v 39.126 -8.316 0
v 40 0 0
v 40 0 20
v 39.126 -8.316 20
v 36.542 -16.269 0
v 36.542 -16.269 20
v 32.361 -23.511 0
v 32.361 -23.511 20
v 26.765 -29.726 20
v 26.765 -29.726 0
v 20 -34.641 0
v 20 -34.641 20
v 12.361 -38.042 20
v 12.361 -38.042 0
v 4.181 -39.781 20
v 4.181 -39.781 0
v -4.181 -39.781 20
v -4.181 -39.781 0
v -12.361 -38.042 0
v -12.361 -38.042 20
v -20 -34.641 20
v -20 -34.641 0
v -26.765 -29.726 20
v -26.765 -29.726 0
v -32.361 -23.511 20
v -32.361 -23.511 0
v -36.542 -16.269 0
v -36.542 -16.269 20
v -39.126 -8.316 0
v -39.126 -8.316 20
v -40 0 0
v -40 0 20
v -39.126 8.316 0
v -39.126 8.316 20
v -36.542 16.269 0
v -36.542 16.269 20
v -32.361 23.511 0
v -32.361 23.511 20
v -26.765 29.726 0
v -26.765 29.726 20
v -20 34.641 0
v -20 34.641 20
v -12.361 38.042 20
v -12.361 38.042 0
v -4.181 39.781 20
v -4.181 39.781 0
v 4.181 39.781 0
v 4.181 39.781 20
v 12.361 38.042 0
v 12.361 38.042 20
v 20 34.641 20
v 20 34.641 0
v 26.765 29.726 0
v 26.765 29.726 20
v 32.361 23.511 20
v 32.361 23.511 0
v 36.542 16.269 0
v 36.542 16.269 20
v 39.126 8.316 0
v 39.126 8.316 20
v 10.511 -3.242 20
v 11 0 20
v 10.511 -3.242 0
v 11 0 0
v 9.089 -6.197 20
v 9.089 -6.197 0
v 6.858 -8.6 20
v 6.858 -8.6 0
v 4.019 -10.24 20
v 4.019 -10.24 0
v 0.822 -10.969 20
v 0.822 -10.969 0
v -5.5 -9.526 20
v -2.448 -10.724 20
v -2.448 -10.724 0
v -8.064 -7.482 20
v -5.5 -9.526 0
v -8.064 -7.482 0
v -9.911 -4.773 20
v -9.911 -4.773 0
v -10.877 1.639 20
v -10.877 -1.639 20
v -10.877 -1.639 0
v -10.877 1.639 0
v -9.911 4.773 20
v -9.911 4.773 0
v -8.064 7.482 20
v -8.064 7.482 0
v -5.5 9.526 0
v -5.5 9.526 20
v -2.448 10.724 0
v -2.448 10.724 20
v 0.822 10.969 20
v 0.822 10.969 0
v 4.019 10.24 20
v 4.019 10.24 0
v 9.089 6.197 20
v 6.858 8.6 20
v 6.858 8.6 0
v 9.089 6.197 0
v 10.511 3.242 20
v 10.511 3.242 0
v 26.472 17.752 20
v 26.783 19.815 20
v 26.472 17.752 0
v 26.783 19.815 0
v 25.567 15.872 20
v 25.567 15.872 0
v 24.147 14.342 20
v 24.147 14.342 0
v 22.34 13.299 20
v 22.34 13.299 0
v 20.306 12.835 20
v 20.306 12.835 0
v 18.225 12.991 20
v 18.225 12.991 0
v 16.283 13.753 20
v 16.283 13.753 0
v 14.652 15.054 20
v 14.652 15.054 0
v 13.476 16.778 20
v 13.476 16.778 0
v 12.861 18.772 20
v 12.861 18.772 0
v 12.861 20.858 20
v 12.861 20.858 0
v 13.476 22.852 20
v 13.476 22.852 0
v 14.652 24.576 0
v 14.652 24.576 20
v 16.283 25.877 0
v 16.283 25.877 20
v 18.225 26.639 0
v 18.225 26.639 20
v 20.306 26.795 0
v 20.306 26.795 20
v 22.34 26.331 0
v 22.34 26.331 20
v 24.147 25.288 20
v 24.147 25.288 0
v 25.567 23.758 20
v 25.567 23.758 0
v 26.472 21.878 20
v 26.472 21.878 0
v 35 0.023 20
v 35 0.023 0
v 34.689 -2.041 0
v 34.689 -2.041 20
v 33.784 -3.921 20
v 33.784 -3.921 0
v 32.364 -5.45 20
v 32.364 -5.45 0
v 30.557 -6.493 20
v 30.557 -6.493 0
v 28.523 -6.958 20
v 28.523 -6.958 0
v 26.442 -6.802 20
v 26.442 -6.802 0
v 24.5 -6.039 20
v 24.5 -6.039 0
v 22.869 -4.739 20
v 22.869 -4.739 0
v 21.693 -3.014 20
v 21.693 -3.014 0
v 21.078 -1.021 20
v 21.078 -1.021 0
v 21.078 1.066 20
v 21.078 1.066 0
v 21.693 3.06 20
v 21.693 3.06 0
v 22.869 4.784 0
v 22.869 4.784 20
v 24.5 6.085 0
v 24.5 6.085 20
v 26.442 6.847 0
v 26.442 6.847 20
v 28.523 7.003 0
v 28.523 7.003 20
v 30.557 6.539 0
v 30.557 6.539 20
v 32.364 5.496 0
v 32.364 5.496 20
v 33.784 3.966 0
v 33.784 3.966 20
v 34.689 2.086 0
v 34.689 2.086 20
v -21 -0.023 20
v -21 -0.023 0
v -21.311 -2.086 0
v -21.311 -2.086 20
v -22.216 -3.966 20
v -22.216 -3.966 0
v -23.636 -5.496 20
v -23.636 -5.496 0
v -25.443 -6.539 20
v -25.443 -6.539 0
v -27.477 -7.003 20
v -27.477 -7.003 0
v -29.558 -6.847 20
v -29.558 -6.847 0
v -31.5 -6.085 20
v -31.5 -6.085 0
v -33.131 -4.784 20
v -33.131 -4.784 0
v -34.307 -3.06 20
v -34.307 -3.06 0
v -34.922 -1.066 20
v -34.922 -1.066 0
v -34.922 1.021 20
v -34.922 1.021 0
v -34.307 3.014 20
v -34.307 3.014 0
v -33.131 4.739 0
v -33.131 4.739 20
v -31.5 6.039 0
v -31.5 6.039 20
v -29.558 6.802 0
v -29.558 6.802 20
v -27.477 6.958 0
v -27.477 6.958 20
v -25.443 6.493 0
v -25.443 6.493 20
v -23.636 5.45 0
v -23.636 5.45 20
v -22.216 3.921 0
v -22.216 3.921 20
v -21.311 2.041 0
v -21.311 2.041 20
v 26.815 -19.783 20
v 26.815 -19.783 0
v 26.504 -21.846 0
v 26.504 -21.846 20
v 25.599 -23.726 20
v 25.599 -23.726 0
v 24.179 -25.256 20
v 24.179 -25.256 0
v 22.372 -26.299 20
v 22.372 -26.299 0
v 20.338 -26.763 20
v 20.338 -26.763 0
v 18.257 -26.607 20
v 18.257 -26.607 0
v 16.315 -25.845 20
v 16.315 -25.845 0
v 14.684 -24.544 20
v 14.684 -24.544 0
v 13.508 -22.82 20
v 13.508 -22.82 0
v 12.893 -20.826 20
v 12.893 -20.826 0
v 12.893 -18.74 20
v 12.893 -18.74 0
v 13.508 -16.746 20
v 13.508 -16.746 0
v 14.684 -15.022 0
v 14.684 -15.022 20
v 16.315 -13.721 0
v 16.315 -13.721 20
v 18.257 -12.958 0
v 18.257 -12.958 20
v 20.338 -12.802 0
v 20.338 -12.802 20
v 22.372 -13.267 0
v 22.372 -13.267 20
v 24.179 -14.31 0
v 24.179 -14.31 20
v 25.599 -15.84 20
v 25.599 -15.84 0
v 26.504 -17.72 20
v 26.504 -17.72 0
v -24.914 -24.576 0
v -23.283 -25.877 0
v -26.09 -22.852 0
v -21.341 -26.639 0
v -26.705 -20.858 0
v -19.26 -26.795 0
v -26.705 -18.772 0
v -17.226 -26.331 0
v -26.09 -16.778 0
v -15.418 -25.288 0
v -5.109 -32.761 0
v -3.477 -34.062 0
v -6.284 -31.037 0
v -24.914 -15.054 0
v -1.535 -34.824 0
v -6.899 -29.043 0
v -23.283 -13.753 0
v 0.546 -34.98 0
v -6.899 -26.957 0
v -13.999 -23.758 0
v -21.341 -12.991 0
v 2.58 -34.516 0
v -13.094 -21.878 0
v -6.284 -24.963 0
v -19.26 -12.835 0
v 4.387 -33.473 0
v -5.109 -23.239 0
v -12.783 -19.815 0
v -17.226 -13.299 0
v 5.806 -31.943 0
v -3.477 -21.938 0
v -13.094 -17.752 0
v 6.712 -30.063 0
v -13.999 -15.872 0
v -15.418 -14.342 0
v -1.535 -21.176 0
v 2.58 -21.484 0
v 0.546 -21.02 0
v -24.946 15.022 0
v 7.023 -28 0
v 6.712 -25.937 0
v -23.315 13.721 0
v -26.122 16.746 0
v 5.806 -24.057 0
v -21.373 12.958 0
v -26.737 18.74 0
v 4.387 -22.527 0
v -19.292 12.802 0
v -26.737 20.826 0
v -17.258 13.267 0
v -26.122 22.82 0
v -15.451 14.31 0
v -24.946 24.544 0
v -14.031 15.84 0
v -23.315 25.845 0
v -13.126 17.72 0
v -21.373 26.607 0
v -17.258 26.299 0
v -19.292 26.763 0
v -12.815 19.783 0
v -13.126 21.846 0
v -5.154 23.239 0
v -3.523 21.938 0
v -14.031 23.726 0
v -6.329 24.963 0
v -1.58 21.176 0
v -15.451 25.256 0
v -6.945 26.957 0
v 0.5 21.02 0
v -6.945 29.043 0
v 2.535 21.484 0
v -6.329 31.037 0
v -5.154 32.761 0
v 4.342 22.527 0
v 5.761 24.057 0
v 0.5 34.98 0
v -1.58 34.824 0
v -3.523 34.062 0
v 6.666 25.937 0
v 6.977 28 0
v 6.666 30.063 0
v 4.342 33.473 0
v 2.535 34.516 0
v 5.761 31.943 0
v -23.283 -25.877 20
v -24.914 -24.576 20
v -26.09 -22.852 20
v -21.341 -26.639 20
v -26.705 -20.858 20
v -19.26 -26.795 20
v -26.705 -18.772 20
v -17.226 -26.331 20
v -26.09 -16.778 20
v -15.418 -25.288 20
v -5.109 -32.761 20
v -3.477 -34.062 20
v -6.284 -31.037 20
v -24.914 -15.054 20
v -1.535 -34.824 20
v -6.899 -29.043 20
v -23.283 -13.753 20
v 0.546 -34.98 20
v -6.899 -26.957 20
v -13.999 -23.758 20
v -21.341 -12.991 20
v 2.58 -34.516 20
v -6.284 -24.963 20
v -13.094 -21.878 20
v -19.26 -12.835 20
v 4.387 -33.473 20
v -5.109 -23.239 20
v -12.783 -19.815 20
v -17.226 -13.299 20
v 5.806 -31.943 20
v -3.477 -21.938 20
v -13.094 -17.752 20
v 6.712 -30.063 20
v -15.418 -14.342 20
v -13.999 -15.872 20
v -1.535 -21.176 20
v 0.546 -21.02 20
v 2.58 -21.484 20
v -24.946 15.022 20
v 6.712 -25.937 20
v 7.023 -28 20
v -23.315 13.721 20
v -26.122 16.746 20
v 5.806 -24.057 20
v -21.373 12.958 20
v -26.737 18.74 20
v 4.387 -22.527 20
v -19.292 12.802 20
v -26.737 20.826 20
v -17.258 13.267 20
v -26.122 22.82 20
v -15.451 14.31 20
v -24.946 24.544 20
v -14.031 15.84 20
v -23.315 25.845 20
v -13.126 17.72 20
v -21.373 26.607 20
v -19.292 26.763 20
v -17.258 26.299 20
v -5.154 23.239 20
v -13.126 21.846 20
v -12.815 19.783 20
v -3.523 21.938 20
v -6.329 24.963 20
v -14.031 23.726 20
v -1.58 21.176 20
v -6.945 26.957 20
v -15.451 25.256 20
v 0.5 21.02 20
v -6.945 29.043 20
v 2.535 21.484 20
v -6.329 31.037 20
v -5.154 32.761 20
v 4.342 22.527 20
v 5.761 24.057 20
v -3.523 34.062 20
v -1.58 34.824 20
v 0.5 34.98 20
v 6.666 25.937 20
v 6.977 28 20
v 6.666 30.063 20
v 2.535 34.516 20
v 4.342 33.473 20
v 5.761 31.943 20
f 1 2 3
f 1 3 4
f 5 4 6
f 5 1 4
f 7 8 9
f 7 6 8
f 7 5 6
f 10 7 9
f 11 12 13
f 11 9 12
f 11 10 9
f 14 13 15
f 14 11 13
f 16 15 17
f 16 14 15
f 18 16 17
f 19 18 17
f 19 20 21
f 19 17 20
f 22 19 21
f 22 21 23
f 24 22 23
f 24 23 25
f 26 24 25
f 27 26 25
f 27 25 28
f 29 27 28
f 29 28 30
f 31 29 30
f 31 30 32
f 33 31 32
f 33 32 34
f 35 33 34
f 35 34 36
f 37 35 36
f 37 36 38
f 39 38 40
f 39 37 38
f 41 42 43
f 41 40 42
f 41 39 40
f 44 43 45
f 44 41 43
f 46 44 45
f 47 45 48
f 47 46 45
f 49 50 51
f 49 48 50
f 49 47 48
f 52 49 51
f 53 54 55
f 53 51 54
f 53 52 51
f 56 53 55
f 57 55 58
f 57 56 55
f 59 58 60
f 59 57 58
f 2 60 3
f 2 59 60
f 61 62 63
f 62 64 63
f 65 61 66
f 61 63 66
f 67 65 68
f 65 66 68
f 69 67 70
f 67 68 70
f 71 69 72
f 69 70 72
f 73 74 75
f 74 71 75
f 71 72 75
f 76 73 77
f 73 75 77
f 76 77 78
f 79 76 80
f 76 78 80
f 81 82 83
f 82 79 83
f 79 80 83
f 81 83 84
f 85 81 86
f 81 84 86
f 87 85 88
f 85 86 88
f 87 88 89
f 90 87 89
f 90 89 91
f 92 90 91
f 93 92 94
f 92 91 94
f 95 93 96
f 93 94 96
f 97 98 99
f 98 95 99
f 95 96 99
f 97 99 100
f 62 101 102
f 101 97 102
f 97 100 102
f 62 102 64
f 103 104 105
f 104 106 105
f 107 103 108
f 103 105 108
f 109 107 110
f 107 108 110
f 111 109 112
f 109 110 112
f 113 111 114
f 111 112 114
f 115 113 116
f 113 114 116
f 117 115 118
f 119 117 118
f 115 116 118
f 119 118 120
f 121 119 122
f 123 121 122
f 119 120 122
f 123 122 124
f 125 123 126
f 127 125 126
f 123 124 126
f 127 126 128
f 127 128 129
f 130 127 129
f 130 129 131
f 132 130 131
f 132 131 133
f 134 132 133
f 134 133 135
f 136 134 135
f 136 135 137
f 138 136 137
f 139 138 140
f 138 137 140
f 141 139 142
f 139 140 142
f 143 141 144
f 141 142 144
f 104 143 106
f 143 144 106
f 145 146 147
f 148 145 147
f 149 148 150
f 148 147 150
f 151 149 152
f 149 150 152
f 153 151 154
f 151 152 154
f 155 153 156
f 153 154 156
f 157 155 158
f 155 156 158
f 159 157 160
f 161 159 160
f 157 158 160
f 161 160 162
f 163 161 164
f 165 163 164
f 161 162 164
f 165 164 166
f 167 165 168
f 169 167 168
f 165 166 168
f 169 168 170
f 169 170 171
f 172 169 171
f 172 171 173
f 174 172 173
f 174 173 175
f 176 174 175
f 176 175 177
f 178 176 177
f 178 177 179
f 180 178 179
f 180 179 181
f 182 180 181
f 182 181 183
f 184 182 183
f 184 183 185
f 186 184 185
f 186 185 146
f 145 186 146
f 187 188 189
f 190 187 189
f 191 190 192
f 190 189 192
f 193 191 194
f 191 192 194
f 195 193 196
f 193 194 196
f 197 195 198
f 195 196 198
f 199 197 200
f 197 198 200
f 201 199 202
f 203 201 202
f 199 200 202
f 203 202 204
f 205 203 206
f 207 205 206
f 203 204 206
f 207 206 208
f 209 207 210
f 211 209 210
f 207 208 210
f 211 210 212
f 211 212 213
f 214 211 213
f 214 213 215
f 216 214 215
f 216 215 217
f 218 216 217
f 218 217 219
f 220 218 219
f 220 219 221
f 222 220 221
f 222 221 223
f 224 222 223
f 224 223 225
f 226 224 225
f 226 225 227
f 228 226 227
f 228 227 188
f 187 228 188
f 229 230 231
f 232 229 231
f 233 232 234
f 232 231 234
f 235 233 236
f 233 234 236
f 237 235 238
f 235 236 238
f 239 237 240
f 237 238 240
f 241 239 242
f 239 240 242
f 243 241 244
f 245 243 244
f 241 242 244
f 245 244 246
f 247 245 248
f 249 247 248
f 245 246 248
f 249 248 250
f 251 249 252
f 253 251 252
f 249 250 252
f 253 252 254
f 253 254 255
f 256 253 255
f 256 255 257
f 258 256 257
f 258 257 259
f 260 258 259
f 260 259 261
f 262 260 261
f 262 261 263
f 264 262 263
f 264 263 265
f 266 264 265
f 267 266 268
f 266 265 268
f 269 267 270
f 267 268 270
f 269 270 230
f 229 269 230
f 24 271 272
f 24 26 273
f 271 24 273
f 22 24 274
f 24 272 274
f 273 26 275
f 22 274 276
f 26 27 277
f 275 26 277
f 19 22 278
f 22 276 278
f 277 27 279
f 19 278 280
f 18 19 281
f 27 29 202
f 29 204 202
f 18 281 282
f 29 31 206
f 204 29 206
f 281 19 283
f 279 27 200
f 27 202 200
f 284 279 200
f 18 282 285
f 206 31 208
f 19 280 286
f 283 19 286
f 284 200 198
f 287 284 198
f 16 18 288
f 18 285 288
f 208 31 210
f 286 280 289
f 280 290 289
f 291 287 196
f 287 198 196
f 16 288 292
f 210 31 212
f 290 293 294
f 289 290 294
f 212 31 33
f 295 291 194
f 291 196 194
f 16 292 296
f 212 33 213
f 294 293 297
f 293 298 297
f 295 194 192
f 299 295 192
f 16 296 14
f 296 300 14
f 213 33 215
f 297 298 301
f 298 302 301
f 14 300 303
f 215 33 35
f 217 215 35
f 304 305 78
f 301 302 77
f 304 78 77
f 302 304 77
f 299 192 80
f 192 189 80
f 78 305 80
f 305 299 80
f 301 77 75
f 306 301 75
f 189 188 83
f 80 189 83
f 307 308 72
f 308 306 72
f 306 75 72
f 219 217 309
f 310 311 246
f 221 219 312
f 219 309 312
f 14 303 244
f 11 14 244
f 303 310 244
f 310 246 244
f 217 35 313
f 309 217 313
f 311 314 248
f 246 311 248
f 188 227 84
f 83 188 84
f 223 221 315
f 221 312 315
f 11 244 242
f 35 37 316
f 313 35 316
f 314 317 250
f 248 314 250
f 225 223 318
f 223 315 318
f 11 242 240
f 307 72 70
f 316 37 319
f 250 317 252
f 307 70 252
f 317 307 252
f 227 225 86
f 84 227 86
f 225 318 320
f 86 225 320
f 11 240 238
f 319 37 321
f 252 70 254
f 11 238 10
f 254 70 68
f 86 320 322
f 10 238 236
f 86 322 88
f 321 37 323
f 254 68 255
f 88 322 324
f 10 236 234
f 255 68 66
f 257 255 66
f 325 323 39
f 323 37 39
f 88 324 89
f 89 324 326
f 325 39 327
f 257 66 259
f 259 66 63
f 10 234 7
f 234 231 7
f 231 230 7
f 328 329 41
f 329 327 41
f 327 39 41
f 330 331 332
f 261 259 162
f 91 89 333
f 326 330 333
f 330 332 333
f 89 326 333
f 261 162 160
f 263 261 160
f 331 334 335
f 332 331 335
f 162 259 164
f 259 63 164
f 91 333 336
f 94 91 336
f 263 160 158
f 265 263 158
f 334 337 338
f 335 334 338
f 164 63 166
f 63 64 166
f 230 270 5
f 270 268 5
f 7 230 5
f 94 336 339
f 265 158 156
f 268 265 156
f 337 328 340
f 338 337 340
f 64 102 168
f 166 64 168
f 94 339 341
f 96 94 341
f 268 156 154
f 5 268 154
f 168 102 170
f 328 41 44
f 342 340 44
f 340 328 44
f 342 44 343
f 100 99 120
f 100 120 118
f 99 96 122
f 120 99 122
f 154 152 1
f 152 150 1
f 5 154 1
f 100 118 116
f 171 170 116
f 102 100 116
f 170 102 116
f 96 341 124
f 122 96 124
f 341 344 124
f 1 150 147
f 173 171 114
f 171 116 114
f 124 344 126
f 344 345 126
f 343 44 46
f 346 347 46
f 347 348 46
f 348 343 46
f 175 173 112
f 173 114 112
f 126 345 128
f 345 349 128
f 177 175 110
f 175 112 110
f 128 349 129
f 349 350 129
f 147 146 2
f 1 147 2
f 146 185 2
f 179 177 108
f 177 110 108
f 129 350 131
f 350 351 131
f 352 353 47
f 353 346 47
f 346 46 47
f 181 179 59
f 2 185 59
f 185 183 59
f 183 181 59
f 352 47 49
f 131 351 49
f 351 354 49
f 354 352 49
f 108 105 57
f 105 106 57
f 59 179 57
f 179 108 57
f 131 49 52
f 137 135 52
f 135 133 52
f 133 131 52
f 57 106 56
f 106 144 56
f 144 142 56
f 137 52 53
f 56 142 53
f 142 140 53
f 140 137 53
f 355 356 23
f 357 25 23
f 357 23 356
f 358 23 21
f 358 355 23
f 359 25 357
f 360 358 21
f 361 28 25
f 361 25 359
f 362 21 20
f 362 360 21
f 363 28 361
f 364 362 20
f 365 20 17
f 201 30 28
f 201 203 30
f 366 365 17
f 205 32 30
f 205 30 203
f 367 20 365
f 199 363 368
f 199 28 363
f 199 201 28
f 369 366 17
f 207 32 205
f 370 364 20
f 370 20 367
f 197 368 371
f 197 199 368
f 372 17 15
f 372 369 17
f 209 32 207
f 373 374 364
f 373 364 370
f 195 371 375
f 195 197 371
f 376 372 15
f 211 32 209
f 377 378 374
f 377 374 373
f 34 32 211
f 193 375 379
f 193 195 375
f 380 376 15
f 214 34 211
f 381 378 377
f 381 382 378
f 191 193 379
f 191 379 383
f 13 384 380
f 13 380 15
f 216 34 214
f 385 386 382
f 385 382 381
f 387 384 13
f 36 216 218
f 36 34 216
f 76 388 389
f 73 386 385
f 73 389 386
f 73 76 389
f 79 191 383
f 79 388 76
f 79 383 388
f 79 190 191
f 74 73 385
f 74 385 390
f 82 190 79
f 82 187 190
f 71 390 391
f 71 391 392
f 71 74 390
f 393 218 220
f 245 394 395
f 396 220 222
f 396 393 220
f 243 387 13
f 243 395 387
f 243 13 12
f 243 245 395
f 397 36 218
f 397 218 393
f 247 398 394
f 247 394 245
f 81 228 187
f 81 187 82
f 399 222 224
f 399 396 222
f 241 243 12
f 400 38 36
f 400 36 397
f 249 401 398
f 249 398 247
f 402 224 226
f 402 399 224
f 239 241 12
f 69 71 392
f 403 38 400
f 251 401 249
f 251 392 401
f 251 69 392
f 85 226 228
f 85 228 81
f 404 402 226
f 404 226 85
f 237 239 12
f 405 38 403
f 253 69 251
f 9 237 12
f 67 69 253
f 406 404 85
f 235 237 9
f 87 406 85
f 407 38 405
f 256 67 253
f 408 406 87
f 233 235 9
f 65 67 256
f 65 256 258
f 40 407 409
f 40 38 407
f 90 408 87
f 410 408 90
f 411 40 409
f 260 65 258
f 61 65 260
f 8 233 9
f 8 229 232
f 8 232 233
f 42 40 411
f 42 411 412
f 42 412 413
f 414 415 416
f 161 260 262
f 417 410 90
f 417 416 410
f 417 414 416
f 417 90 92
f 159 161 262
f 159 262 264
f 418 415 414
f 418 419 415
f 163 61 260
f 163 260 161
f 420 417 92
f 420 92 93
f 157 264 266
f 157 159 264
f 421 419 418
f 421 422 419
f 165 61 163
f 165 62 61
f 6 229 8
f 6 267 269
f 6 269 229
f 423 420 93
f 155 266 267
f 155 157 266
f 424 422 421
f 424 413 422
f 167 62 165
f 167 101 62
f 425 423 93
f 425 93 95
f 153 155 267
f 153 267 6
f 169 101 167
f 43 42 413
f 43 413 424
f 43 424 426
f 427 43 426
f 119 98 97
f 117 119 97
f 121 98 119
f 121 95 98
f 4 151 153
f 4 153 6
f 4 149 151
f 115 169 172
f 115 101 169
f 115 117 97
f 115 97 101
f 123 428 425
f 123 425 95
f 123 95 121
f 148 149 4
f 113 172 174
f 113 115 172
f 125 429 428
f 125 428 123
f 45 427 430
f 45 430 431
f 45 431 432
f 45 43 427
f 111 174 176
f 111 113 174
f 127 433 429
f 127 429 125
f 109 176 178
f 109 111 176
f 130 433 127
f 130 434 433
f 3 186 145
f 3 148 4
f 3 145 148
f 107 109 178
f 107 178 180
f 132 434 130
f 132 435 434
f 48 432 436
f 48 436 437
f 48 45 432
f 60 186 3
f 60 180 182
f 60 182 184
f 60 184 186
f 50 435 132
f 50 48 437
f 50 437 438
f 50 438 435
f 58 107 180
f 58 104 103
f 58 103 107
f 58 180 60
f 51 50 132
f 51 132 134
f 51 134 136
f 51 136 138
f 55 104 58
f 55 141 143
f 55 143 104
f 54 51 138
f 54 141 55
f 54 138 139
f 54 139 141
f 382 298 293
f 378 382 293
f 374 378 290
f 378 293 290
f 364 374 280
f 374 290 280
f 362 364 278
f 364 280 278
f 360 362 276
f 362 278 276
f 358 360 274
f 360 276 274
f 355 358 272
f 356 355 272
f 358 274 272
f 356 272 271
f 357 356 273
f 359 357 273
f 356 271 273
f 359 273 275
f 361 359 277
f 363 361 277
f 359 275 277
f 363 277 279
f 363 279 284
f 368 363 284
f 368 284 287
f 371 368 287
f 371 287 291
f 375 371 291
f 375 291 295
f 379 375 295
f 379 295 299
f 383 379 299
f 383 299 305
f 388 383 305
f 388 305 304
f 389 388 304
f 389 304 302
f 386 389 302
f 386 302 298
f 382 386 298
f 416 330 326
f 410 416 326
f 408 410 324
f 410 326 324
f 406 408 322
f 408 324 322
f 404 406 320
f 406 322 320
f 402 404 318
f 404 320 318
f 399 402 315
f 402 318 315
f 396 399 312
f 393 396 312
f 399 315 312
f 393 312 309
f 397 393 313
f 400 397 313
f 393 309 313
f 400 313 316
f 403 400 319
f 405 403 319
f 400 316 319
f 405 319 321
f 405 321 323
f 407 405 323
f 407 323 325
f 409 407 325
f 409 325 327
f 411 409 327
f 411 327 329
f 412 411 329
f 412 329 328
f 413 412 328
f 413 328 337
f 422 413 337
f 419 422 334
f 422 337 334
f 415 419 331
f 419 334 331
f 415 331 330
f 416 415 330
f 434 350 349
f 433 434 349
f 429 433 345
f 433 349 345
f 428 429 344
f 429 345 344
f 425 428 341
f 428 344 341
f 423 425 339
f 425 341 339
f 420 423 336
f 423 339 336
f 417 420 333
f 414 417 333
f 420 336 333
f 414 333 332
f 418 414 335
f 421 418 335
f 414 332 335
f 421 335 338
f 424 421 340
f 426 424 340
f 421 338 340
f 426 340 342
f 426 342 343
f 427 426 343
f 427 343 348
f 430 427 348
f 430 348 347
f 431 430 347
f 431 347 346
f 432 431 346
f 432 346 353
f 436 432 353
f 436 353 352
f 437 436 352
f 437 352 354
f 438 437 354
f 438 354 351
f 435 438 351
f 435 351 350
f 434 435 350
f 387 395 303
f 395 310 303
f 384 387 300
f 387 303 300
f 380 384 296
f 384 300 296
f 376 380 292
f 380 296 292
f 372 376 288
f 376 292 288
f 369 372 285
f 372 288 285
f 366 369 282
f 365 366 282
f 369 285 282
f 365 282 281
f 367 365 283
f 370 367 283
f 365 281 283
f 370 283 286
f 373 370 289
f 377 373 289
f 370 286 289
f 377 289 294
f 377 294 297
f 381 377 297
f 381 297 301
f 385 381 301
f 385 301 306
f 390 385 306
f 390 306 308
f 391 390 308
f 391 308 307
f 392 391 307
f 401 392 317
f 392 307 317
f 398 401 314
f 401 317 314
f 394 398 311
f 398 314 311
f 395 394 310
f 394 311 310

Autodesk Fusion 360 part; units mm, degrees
sketch "Sketch1" plane through (0, 0, 0) normal (0, 0, 1) x (1, 0, 0)
  circle A0 centre (0, 0) radius 40
  circle A1 centre (0, 0) radius 28
  circle A2 centre (0, 0) radius 11
  circle A3 centre (28, 0.0227) radius 7
  circle A4 centre (19.7829, 19.815) radius 7
  circle A5 centre (-0.0227, 28) radius 7
  circle A6 centre (-19.815, 19.7829) radius 7
  circle A7 centre (-28, -0.0227) radius 7
  circle A8 centre (-19.7829, -19.815) radius 7
  circle A9 centre (0.0227, -28) radius 7
  circle A10 centre (19.815, -19.7829) radius 7
  dimension "d1" = 80
  dimension "d2" = 56
  dimension "d3" = 22
  dimension "d4" = 14
  dimension "d6" = 360
extrude "Extrude1" add sketch "Sketch1" along normal blind 20 contours A0 | A1 A3 A4 A5 A6 A7 A8 A9 A10
